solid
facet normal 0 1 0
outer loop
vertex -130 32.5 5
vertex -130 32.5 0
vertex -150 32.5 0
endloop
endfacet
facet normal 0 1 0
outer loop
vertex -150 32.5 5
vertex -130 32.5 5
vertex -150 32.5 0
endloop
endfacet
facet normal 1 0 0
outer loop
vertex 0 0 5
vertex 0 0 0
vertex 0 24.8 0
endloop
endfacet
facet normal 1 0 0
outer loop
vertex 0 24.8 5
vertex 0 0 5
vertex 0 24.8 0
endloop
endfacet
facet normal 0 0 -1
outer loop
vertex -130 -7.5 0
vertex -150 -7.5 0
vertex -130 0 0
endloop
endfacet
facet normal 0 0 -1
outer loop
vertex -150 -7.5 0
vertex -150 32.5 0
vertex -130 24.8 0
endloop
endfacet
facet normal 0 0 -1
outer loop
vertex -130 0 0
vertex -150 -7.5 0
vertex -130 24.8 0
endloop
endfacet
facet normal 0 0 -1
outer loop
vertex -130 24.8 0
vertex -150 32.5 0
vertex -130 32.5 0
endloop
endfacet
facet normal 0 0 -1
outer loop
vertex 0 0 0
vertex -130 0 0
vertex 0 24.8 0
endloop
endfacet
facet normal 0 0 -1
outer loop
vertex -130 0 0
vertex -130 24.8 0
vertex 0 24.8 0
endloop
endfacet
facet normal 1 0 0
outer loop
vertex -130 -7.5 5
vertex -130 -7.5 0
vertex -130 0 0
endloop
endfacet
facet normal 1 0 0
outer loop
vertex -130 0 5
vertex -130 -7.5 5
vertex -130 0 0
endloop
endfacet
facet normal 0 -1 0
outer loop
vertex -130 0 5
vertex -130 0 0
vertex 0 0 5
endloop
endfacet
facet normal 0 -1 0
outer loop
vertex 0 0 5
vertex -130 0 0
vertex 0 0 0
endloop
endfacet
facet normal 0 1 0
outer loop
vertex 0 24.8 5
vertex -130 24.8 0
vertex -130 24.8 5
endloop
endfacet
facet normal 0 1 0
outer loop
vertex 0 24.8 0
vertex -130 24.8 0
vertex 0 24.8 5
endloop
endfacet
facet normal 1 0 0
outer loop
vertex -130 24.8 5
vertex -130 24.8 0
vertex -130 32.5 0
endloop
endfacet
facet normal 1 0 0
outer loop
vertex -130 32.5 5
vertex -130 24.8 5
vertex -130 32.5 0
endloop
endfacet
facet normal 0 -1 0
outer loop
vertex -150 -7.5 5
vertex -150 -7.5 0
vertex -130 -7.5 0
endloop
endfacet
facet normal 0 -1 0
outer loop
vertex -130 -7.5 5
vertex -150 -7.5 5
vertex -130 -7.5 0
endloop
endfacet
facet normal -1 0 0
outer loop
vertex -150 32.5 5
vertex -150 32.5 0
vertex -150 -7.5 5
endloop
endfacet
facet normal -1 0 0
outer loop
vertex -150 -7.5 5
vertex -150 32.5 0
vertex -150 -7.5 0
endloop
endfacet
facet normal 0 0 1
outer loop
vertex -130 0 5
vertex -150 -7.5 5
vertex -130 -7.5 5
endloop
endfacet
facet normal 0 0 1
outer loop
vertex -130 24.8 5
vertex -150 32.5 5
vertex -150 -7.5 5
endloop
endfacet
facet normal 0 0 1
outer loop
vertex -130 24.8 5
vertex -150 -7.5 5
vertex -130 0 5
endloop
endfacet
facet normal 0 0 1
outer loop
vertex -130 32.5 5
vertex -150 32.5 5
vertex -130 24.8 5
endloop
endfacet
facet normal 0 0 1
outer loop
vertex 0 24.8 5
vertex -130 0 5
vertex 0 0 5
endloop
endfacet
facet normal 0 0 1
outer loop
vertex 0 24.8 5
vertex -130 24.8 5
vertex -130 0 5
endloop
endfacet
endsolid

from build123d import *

# Parameters (mm, degrees)
SKETCH_1_W      = 130
SKETCH_1_H      = 24.8
EXTRUDE_1_DEPTH = 5


with BuildPart() as part:
    # 草图1 → 凸台-拉伸1 (new body)
    with BuildSketch(Plane.XY):
        Polygon((-130, -7.5), (-130, 0), (-130, 24.8), (-130, 32.5), (-150, 32.5), (-150, -7.5), align=None)
        with Locations((-65, 12.4)):
            Rectangle(SKETCH_1_W, SKETCH_1_H)
    extrude(amount=EXTRUDE_1_DEPTH)


solid = part.part
